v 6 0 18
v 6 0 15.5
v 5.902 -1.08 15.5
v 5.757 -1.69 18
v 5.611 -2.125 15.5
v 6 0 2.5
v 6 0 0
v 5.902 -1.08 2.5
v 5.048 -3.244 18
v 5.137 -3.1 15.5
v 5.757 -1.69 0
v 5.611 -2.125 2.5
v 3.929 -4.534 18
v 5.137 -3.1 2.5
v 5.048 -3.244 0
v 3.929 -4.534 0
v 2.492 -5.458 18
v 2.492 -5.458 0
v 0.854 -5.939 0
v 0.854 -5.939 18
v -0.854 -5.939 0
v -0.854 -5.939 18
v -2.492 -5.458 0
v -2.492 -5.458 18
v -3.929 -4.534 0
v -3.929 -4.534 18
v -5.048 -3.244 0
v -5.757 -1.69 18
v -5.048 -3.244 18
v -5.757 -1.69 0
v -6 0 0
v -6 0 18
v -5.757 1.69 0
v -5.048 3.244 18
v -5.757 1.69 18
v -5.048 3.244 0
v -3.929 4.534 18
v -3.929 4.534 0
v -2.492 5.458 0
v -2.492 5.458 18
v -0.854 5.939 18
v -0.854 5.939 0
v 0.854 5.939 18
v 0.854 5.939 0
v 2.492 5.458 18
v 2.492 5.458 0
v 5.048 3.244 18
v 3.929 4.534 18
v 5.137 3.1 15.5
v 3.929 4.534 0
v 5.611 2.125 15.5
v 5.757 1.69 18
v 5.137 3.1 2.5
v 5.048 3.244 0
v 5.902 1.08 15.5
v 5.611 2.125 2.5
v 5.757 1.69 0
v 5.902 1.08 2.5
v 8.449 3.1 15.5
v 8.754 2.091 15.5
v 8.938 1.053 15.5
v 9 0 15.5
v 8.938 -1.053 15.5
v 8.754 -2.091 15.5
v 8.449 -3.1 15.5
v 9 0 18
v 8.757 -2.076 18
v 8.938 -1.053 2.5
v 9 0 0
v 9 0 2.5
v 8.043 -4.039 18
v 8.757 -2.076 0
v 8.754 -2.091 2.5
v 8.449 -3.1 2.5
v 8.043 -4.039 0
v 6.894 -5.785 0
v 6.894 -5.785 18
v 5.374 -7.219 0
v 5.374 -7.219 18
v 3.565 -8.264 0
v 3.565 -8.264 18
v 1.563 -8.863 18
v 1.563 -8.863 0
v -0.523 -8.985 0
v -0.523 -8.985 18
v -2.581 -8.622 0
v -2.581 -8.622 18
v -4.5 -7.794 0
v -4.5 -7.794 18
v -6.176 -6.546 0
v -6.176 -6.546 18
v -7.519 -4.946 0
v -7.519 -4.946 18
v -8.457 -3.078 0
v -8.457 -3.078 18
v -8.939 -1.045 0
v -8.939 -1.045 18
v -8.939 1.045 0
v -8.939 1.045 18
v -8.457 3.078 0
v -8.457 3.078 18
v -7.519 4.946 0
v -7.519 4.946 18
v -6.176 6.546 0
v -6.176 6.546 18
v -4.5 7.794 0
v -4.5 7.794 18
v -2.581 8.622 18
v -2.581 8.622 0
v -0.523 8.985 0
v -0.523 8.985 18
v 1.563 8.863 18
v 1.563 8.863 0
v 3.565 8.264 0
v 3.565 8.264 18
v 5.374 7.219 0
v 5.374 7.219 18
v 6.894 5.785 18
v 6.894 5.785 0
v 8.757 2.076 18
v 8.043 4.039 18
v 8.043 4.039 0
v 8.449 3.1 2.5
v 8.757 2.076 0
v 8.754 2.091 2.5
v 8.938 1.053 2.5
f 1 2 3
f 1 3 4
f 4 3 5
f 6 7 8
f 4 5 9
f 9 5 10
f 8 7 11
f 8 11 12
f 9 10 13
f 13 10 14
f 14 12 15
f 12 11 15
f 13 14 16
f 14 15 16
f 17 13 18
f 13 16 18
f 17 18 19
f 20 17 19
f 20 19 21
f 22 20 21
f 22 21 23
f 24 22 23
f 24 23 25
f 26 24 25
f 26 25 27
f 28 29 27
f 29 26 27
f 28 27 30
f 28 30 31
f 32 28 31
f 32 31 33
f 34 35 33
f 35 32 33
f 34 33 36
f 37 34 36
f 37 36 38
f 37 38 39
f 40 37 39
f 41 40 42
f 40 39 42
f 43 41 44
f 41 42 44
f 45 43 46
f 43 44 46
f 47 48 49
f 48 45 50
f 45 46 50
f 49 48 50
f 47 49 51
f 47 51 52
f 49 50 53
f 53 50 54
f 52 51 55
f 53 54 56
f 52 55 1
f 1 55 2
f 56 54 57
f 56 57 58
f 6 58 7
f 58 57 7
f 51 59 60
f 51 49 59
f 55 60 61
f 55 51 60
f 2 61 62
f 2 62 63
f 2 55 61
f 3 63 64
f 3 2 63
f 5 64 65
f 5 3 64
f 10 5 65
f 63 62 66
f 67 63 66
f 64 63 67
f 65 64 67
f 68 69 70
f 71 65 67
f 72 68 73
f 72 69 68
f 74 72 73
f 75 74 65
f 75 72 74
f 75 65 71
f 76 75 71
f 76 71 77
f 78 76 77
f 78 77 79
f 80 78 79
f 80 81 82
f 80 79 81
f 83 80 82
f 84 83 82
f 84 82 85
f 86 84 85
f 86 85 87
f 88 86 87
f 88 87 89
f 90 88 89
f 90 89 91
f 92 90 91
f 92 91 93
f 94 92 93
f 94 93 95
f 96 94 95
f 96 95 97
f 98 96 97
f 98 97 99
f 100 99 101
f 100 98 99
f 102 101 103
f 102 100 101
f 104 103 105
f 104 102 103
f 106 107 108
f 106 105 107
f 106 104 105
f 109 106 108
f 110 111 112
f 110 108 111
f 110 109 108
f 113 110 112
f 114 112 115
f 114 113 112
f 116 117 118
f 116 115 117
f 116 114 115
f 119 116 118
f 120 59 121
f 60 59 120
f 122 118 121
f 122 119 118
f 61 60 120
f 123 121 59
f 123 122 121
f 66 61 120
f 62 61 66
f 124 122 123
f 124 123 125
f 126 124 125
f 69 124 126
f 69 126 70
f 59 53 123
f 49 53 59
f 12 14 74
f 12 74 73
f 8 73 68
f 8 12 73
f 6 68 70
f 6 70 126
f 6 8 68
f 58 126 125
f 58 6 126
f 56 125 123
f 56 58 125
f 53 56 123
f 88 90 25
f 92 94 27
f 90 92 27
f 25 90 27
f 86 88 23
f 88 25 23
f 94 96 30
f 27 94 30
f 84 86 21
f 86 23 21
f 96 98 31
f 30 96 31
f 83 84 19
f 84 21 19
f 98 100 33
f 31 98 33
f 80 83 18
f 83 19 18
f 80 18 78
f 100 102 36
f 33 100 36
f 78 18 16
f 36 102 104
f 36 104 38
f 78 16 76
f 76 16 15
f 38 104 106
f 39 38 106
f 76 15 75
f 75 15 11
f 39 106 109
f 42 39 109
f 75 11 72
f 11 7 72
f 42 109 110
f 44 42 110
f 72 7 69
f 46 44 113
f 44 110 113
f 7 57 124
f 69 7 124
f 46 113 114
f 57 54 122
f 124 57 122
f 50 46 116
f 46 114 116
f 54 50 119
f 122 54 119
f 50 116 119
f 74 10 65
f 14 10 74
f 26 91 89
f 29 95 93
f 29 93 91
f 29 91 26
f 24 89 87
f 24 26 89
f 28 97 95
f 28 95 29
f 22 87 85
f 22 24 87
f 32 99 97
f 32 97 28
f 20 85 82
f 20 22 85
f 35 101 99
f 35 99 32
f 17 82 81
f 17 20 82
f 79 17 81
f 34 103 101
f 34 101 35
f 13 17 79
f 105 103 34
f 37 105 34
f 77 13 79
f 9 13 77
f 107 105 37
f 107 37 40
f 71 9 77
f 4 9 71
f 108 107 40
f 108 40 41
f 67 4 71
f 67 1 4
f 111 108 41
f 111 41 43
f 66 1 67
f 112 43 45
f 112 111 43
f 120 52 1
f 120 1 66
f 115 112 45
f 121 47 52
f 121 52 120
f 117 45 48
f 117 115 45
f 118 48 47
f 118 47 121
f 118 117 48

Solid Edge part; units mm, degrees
sketch "Sketch1" plane through (0, 0, 0) normal (0, 0, 1) x (1, 0, 0)
  circle A0 centre (0, 0) radius 6
  circle A1 centre (0, 0) radius 9
  dimension "D1" = 12
  dimension "D2" = 18
extrude "Protrusion1" add sketch "Sketch1" along normal blind 18
sketch "Sketch2" plane through (0, 0, 0) normal (-1, 0, 0) x (0, -1, 0)
  line L0 (-3.1, 15.5) -> (3.1, 15.5)
  line L1 (3.1, 15.5) -> (3.1, 2.5)
  line L2 (3.1, 2.5) -> (-3.1, 2.5)
  line L3 (-3.1, 2.5) -> (-3.1, 15.5)
  dimension "D1" = 6.2
  dimension "D2" = 13
extrude "Cutout1" cut sketch "Sketch2" against normal up to next
